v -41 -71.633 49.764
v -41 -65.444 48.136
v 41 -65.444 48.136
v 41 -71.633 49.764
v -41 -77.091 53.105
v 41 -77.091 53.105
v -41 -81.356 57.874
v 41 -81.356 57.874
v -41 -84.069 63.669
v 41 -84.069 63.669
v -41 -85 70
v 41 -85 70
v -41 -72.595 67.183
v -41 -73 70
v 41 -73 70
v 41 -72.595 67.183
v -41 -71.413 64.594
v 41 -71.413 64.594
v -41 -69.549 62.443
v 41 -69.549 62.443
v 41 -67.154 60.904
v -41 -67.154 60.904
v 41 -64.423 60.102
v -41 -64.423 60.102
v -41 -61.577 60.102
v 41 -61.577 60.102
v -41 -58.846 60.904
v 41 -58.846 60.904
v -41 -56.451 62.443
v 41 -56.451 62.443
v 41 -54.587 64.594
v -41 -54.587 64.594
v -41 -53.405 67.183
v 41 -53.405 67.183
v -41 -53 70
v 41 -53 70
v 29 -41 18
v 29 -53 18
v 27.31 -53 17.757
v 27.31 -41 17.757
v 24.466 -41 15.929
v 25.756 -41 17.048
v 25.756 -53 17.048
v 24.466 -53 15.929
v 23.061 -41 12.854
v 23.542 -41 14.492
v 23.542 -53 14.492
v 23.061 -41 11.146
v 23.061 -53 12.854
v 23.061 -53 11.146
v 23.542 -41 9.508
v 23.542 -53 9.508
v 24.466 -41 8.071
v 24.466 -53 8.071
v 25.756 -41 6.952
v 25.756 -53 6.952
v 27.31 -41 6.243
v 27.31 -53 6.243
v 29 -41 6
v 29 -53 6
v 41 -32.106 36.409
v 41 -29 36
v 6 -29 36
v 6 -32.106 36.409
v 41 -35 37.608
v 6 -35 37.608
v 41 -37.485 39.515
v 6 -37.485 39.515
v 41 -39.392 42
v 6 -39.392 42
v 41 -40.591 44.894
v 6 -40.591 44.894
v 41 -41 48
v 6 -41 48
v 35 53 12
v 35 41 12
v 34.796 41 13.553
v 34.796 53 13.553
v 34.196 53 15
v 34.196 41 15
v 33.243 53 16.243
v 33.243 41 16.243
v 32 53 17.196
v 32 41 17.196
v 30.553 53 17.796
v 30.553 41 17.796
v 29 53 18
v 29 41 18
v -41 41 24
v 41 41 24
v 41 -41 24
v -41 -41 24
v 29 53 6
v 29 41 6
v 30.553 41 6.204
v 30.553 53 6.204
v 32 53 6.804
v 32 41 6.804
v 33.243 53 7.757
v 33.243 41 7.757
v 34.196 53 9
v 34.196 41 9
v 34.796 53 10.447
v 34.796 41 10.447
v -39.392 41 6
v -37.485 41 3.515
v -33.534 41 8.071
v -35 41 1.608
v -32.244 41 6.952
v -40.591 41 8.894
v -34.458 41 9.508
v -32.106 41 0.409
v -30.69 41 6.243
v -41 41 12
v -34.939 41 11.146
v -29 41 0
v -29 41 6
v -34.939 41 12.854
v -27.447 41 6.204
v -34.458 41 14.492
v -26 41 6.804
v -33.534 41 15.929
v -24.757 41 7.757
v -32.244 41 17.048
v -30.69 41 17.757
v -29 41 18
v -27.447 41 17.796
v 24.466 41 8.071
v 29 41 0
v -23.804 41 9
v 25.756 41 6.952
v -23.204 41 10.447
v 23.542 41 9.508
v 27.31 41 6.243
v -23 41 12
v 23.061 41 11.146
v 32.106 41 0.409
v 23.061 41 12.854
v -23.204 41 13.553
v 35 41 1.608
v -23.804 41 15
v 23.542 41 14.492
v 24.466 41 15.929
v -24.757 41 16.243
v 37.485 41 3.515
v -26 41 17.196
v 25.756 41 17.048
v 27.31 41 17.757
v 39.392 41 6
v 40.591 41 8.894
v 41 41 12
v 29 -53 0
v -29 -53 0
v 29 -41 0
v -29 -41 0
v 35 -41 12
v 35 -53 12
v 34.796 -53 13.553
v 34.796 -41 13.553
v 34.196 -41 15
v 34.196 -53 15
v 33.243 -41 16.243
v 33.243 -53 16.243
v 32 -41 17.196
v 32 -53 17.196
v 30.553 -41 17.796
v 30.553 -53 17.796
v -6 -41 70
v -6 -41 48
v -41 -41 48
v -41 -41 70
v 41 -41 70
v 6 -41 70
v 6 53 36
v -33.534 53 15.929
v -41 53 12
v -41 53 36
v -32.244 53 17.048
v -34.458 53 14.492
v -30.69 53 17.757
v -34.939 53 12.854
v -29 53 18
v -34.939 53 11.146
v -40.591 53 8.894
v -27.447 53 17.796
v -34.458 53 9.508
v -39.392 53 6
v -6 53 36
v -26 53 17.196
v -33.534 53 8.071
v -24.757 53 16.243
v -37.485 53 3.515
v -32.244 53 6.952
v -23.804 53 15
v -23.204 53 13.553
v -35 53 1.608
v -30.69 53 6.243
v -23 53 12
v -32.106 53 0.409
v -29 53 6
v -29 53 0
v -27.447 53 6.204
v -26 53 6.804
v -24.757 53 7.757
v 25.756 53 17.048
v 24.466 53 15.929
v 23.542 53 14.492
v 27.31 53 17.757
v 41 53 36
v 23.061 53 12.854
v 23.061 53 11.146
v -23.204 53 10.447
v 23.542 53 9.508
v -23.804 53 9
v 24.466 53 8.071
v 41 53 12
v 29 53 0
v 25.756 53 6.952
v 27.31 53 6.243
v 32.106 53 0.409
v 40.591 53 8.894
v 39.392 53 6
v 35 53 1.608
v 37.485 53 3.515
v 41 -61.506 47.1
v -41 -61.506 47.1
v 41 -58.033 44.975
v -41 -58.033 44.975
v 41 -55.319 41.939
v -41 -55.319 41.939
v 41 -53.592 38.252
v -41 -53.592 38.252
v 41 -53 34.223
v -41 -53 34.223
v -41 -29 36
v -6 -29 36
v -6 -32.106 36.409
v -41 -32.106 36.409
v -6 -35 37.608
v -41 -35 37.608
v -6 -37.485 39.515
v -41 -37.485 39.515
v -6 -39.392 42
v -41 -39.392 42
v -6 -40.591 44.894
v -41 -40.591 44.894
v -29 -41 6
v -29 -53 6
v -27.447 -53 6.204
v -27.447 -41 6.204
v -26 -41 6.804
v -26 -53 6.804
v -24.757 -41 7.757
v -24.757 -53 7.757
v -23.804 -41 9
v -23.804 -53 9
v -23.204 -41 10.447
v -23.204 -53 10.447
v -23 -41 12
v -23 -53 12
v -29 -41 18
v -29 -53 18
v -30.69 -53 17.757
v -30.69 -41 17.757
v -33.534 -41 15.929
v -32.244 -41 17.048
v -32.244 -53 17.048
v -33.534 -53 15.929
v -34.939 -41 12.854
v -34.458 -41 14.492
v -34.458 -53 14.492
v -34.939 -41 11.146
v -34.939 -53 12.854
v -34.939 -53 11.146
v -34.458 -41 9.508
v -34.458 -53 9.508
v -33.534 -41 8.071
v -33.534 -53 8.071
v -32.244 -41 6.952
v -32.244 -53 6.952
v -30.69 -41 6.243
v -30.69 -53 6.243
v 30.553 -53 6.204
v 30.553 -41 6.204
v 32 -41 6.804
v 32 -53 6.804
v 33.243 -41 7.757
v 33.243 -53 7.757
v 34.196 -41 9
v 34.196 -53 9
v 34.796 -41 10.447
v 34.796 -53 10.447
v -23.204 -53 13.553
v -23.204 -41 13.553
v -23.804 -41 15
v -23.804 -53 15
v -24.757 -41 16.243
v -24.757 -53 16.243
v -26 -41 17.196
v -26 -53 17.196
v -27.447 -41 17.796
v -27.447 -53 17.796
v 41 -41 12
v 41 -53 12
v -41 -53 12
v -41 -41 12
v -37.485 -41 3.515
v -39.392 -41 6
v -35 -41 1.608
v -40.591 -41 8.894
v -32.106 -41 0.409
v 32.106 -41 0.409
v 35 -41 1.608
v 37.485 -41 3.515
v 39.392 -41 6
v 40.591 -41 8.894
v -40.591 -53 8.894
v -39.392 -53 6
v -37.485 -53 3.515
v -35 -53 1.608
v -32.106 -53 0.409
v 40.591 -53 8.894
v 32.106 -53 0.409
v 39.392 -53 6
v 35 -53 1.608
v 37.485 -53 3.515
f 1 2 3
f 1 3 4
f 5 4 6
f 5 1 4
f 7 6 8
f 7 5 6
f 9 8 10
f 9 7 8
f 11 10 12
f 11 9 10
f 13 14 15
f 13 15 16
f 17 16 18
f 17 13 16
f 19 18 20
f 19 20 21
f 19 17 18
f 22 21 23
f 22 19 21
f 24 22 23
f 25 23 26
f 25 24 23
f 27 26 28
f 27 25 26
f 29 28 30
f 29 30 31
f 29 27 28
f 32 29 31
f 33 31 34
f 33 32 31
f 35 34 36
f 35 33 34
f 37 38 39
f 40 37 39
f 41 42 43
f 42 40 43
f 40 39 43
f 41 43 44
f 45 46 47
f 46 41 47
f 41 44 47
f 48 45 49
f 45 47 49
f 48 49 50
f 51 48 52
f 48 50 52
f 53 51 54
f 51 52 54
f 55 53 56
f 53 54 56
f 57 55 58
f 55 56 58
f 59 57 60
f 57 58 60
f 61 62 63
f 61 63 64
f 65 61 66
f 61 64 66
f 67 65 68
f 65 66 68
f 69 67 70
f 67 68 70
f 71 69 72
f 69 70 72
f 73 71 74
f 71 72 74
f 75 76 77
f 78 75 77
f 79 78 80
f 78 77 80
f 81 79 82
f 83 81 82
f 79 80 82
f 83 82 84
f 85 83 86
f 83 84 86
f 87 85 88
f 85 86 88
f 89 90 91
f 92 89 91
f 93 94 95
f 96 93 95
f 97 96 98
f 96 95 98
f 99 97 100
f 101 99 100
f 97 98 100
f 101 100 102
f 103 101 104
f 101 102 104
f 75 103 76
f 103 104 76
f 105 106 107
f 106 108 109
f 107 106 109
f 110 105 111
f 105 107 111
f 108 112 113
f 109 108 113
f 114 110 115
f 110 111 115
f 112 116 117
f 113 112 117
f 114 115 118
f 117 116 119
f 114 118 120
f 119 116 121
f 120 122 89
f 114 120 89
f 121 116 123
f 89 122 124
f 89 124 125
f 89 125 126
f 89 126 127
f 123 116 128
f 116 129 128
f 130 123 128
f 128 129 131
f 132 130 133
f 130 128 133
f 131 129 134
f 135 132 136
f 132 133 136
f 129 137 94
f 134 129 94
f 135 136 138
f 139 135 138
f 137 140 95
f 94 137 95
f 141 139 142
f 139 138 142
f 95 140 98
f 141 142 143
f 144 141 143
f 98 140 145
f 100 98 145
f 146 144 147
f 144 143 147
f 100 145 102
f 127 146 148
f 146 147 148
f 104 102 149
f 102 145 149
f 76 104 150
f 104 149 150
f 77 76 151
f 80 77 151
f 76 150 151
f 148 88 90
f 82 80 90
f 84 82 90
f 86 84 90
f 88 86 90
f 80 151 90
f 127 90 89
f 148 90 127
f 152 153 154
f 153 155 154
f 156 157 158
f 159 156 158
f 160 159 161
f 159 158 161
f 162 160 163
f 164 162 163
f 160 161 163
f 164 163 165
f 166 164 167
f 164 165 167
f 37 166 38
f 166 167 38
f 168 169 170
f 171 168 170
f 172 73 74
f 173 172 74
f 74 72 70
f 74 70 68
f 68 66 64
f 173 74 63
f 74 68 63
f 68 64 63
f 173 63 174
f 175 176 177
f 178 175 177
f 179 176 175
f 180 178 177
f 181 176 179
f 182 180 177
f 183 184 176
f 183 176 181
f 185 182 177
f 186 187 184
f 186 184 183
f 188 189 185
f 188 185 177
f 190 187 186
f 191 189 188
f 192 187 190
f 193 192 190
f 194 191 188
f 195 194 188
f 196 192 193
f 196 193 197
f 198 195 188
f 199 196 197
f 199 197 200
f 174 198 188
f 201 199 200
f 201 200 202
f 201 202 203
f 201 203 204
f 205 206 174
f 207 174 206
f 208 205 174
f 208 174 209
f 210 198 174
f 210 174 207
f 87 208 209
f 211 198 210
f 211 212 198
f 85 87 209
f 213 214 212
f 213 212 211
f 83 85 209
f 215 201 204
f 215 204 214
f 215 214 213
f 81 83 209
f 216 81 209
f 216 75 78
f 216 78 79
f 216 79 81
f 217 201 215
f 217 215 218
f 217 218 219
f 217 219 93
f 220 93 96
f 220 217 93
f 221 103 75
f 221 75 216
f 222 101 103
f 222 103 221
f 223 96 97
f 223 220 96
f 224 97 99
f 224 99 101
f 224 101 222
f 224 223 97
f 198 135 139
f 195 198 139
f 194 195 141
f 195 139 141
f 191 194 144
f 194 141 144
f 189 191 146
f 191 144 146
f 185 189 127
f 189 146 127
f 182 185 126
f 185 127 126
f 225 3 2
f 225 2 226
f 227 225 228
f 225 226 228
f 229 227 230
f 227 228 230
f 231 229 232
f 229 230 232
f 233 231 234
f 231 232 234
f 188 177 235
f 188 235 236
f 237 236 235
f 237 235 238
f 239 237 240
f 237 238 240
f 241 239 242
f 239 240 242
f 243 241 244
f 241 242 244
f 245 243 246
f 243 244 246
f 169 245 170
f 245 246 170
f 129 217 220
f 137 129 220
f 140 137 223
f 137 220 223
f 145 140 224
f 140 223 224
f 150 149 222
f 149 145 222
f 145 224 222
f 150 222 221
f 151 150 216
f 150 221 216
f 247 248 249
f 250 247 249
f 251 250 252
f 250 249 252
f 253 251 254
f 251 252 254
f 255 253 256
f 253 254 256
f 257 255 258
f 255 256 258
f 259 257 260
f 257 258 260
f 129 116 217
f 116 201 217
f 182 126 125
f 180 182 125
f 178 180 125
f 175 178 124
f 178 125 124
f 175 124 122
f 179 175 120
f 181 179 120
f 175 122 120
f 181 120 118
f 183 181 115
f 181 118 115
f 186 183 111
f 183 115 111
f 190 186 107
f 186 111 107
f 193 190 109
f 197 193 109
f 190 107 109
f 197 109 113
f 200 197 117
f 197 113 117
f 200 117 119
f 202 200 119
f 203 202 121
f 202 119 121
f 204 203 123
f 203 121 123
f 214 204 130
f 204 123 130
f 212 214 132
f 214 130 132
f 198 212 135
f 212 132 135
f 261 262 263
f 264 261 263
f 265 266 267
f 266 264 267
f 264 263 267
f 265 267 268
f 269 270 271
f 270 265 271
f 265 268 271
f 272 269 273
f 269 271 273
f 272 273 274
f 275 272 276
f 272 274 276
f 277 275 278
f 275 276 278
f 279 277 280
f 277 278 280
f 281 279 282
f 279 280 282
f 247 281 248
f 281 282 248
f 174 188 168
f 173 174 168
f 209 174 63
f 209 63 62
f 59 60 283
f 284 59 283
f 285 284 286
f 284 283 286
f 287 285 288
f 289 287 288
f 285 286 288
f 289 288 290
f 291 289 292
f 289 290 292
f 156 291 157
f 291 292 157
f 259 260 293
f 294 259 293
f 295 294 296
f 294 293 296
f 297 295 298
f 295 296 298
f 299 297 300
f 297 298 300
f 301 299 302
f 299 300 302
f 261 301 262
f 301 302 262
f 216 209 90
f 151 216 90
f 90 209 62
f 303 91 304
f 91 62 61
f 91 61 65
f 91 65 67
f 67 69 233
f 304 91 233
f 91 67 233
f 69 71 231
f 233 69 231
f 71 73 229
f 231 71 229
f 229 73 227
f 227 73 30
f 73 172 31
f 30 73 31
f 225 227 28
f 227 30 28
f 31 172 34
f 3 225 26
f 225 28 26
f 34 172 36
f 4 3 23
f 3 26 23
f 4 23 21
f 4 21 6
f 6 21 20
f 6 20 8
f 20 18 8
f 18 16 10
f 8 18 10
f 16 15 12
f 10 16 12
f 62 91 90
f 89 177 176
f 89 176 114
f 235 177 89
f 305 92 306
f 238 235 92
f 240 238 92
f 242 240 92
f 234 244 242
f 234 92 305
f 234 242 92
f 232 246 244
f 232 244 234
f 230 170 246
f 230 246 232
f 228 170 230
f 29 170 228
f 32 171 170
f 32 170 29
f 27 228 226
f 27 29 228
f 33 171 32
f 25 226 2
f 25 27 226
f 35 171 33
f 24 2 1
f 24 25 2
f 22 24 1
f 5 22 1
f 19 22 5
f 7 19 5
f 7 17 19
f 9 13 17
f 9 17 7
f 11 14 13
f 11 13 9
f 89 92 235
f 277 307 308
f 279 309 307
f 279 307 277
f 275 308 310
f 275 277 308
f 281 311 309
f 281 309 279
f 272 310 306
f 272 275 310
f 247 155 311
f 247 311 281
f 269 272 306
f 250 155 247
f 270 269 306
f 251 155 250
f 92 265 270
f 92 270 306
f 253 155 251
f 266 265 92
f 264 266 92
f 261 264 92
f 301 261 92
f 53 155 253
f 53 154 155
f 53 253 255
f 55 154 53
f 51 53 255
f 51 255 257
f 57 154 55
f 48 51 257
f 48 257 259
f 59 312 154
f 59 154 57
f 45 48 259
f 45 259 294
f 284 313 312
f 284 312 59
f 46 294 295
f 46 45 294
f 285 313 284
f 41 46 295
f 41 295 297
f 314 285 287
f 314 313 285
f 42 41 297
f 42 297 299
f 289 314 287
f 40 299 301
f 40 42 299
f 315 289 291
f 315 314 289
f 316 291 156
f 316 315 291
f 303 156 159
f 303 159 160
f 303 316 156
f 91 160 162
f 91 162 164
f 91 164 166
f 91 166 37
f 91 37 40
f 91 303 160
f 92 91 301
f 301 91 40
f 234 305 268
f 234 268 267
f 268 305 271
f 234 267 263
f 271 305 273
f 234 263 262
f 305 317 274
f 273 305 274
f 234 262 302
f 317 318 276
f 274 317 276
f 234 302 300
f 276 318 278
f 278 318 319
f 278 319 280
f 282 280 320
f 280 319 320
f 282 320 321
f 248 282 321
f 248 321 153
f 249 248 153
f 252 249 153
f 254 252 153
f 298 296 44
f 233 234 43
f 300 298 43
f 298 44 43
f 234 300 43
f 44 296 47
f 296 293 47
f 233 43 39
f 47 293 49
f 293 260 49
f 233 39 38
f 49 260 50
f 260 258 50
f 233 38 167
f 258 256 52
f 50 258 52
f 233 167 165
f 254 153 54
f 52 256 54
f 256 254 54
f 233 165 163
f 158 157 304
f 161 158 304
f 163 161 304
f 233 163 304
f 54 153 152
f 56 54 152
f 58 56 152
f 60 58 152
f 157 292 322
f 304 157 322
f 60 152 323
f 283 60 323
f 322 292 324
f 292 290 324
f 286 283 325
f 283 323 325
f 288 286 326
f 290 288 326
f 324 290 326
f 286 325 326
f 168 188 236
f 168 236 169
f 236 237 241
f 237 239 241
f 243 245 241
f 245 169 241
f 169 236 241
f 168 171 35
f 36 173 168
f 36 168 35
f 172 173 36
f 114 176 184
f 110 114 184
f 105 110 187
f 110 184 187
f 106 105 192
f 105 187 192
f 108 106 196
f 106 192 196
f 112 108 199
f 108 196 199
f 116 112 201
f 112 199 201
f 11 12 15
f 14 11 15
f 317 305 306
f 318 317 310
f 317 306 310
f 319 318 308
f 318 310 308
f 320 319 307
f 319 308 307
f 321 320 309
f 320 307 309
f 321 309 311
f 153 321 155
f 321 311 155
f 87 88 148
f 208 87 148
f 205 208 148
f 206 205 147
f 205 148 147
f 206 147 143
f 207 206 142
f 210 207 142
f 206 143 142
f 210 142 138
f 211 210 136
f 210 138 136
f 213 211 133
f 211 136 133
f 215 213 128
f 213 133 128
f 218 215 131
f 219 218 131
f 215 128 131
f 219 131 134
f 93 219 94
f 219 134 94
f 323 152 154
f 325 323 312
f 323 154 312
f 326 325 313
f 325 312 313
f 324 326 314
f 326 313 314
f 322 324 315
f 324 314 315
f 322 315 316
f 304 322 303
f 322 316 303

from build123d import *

# Parameters (mm, degrees)
F0_W      = 82
F0_H      = 106
F1_DEPTH  = 36
F3_R      = 12
F4_DEPTH  = 191.1
F5_R      = 12
F7_DEPTH  = 174.6
F9_W      = 82
F9_H      = 12.96312543
F10_DEPTH = 116.9
F12_DEPTH = 34
F14_DEPTH = 25
F15_W     = 12
F15_H     = 34
F16_DEPTH = 25
F18_DEPTH = 34
F19_R     = 12
F21_DEPTH = 82
F22_R     = 14


# Not quite as in the source:
# - a feature of the source that left no trace in its solid (it failed there, or was rolled back) is left out


with BuildPart() as f1:
    # F0 (on Top) → F1 (new body)
    with BuildSketch(Plane.XY):
        Rectangle(F0_W, F0_H)
    extrude(amount=F1_DEPTH)

    # F3
    f3_edges = [f1.edges().sort_by_distance(p)[0] for p in [
        (-41, 0, 0),
    ]]
    fillet(f3_edges, radius=F3_R)

    # F2 (on face) → F4 (cut)
    with BuildSketch(Plane.XZ.offset(53)):
        with BuildLine():
            ThreePointArc((-29, 18), (-35, 12), (-29, 6))
            Line((-29, 6), (-29, 12))
            Line((-29, 12), (-29, 18))
        make_face()
        with BuildLine():
            Line((-29, 12), (-29, 6))
            ThreePointArc((-29, 6), (-24.7573593129, 7.7573593129), (-23, 12))
            ThreePointArc((-23, 12), (-24.7573593129, 16.2426406871), (-29, 18))
            Line((-29, 18), (-29, 12))
        make_face()
        with BuildLine():
            Line((29, 12), (29, 6))
            ThreePointArc((29, 6), (33.2426406871, 7.7573593129), (35, 12))
            ThreePointArc((35, 12), (33.2426406871, 16.2426406871), (29, 18))
            Line((29, 18), (29, 12))
        make_face()
        with BuildLine():
            ThreePointArc((29, 18), (23, 12), (29, 6))
            Line((29, 6), (29, 12))
            Line((29, 12), (29, 18))
        make_face()
    extrude(amount=-F4_DEPTH, mode=Mode.SUBTRACT)

    # F5
    f5_edges = [f1.edges().sort_by_distance(p)[0] for p in [
        (41, 0, 0),
    ]]
    fillet(f5_edges, radius=F5_R)

    # F6 (on face) → F7 (cut)
    with BuildSketch(Plane.YZ.offset(41)):
        Polygon((41, 24), (-30.1027745008, 24), (-41, 24), (-41, 12), (41, 12), align=None)
    extrude(amount=-F7_DEPTH, mode=Mode.SUBTRACT)

    # F9 (on face) → F10 (cut)
    with BuildSketch(Plane.YZ.offset(41)):
        with Locations((0, 5.518437285)):
            Rectangle(F9_W, F9_H)
    extrude(amount=-F10_DEPTH, mode=Mode.SUBTRACT)

    # F11 (on face) → F12 (join)
    with BuildSketch(Plane.XY.offset(36)):
        Polygon((0, 53), (-6, 53), (-6, -53), (6, -53), (6, 53), align=None)
    extrude(amount=F12_DEPTH)

    # F13 (on face) → F14 (cut)
    with BuildSketch(Plane(origin=(-6, 0, 0), x_dir=(0, -1, 0), z_dir=(-1, 0, 0))):
        Polygon((-53, 70), (-53, 36), (41, 70), align=None)
    extrude(amount=-F14_DEPTH, mode=Mode.SUBTRACT)

    # F15 (on face) → F16 (cut)
    with BuildSketch(Plane(origin=(-6, 0, 0), x_dir=(0, -1, 0), z_dir=(-1, 0, 0))):
        with Locations((47, 53)):
            Rectangle(F15_W, F15_H)
    extrude(amount=-F16_DEPTH, mode=Mode.SUBTRACT)

    # F17 (on face) → F18 (join)
    with BuildSketch(Plane.XY.offset(36)):
        Polygon((41, -53), (41, -41), (6, -41), (-6, -41), (-41, -41), (-41, -53), align=None)
    extrude(amount=F18_DEPTH)

    # F19
    f19_edges = [f1.edges().sort_by_distance(p)[0] for p in [
        (-23.5, -41, 36),
        (23.5, -41, 36),
    ]]
    fillet(f19_edges, radius=F19_R)

    # F20 (on face) → F21 (join, through all)
    with BuildSketch(Plane(origin=(-41, 0, 0), x_dir=(0, -1, 0), z_dir=(-1, 0, 0))):
        with BuildLine():
            Line((53, 70), (53, 50.4040820577))
            ThreePointArc((53, 50.4040820577), (74.4891252931, 51.2383369607), (85, 70))
            Line((85, 70), (73, 70))
            ThreePointArc((73, 70), (63, 60), (53, 70))
        make_face()
        with BuildLine():
            Line((53, 70), (41, 70))
            ThreePointArc((41, 70), (44.2383369607, 58.5108747069), (53, 50.4040820577))
            Line((53, 50.4040820577), (53, 70))
        make_face()
    extrude(amount=-F21_DEPTH)

    # F22
    f22_edges = [f1.edges().sort_by_distance(p)[0] for p in [
        (0, -53, 50.404082),
    ]]
    fillet(f22_edges, radius=F22_R)


solid = f1.part
